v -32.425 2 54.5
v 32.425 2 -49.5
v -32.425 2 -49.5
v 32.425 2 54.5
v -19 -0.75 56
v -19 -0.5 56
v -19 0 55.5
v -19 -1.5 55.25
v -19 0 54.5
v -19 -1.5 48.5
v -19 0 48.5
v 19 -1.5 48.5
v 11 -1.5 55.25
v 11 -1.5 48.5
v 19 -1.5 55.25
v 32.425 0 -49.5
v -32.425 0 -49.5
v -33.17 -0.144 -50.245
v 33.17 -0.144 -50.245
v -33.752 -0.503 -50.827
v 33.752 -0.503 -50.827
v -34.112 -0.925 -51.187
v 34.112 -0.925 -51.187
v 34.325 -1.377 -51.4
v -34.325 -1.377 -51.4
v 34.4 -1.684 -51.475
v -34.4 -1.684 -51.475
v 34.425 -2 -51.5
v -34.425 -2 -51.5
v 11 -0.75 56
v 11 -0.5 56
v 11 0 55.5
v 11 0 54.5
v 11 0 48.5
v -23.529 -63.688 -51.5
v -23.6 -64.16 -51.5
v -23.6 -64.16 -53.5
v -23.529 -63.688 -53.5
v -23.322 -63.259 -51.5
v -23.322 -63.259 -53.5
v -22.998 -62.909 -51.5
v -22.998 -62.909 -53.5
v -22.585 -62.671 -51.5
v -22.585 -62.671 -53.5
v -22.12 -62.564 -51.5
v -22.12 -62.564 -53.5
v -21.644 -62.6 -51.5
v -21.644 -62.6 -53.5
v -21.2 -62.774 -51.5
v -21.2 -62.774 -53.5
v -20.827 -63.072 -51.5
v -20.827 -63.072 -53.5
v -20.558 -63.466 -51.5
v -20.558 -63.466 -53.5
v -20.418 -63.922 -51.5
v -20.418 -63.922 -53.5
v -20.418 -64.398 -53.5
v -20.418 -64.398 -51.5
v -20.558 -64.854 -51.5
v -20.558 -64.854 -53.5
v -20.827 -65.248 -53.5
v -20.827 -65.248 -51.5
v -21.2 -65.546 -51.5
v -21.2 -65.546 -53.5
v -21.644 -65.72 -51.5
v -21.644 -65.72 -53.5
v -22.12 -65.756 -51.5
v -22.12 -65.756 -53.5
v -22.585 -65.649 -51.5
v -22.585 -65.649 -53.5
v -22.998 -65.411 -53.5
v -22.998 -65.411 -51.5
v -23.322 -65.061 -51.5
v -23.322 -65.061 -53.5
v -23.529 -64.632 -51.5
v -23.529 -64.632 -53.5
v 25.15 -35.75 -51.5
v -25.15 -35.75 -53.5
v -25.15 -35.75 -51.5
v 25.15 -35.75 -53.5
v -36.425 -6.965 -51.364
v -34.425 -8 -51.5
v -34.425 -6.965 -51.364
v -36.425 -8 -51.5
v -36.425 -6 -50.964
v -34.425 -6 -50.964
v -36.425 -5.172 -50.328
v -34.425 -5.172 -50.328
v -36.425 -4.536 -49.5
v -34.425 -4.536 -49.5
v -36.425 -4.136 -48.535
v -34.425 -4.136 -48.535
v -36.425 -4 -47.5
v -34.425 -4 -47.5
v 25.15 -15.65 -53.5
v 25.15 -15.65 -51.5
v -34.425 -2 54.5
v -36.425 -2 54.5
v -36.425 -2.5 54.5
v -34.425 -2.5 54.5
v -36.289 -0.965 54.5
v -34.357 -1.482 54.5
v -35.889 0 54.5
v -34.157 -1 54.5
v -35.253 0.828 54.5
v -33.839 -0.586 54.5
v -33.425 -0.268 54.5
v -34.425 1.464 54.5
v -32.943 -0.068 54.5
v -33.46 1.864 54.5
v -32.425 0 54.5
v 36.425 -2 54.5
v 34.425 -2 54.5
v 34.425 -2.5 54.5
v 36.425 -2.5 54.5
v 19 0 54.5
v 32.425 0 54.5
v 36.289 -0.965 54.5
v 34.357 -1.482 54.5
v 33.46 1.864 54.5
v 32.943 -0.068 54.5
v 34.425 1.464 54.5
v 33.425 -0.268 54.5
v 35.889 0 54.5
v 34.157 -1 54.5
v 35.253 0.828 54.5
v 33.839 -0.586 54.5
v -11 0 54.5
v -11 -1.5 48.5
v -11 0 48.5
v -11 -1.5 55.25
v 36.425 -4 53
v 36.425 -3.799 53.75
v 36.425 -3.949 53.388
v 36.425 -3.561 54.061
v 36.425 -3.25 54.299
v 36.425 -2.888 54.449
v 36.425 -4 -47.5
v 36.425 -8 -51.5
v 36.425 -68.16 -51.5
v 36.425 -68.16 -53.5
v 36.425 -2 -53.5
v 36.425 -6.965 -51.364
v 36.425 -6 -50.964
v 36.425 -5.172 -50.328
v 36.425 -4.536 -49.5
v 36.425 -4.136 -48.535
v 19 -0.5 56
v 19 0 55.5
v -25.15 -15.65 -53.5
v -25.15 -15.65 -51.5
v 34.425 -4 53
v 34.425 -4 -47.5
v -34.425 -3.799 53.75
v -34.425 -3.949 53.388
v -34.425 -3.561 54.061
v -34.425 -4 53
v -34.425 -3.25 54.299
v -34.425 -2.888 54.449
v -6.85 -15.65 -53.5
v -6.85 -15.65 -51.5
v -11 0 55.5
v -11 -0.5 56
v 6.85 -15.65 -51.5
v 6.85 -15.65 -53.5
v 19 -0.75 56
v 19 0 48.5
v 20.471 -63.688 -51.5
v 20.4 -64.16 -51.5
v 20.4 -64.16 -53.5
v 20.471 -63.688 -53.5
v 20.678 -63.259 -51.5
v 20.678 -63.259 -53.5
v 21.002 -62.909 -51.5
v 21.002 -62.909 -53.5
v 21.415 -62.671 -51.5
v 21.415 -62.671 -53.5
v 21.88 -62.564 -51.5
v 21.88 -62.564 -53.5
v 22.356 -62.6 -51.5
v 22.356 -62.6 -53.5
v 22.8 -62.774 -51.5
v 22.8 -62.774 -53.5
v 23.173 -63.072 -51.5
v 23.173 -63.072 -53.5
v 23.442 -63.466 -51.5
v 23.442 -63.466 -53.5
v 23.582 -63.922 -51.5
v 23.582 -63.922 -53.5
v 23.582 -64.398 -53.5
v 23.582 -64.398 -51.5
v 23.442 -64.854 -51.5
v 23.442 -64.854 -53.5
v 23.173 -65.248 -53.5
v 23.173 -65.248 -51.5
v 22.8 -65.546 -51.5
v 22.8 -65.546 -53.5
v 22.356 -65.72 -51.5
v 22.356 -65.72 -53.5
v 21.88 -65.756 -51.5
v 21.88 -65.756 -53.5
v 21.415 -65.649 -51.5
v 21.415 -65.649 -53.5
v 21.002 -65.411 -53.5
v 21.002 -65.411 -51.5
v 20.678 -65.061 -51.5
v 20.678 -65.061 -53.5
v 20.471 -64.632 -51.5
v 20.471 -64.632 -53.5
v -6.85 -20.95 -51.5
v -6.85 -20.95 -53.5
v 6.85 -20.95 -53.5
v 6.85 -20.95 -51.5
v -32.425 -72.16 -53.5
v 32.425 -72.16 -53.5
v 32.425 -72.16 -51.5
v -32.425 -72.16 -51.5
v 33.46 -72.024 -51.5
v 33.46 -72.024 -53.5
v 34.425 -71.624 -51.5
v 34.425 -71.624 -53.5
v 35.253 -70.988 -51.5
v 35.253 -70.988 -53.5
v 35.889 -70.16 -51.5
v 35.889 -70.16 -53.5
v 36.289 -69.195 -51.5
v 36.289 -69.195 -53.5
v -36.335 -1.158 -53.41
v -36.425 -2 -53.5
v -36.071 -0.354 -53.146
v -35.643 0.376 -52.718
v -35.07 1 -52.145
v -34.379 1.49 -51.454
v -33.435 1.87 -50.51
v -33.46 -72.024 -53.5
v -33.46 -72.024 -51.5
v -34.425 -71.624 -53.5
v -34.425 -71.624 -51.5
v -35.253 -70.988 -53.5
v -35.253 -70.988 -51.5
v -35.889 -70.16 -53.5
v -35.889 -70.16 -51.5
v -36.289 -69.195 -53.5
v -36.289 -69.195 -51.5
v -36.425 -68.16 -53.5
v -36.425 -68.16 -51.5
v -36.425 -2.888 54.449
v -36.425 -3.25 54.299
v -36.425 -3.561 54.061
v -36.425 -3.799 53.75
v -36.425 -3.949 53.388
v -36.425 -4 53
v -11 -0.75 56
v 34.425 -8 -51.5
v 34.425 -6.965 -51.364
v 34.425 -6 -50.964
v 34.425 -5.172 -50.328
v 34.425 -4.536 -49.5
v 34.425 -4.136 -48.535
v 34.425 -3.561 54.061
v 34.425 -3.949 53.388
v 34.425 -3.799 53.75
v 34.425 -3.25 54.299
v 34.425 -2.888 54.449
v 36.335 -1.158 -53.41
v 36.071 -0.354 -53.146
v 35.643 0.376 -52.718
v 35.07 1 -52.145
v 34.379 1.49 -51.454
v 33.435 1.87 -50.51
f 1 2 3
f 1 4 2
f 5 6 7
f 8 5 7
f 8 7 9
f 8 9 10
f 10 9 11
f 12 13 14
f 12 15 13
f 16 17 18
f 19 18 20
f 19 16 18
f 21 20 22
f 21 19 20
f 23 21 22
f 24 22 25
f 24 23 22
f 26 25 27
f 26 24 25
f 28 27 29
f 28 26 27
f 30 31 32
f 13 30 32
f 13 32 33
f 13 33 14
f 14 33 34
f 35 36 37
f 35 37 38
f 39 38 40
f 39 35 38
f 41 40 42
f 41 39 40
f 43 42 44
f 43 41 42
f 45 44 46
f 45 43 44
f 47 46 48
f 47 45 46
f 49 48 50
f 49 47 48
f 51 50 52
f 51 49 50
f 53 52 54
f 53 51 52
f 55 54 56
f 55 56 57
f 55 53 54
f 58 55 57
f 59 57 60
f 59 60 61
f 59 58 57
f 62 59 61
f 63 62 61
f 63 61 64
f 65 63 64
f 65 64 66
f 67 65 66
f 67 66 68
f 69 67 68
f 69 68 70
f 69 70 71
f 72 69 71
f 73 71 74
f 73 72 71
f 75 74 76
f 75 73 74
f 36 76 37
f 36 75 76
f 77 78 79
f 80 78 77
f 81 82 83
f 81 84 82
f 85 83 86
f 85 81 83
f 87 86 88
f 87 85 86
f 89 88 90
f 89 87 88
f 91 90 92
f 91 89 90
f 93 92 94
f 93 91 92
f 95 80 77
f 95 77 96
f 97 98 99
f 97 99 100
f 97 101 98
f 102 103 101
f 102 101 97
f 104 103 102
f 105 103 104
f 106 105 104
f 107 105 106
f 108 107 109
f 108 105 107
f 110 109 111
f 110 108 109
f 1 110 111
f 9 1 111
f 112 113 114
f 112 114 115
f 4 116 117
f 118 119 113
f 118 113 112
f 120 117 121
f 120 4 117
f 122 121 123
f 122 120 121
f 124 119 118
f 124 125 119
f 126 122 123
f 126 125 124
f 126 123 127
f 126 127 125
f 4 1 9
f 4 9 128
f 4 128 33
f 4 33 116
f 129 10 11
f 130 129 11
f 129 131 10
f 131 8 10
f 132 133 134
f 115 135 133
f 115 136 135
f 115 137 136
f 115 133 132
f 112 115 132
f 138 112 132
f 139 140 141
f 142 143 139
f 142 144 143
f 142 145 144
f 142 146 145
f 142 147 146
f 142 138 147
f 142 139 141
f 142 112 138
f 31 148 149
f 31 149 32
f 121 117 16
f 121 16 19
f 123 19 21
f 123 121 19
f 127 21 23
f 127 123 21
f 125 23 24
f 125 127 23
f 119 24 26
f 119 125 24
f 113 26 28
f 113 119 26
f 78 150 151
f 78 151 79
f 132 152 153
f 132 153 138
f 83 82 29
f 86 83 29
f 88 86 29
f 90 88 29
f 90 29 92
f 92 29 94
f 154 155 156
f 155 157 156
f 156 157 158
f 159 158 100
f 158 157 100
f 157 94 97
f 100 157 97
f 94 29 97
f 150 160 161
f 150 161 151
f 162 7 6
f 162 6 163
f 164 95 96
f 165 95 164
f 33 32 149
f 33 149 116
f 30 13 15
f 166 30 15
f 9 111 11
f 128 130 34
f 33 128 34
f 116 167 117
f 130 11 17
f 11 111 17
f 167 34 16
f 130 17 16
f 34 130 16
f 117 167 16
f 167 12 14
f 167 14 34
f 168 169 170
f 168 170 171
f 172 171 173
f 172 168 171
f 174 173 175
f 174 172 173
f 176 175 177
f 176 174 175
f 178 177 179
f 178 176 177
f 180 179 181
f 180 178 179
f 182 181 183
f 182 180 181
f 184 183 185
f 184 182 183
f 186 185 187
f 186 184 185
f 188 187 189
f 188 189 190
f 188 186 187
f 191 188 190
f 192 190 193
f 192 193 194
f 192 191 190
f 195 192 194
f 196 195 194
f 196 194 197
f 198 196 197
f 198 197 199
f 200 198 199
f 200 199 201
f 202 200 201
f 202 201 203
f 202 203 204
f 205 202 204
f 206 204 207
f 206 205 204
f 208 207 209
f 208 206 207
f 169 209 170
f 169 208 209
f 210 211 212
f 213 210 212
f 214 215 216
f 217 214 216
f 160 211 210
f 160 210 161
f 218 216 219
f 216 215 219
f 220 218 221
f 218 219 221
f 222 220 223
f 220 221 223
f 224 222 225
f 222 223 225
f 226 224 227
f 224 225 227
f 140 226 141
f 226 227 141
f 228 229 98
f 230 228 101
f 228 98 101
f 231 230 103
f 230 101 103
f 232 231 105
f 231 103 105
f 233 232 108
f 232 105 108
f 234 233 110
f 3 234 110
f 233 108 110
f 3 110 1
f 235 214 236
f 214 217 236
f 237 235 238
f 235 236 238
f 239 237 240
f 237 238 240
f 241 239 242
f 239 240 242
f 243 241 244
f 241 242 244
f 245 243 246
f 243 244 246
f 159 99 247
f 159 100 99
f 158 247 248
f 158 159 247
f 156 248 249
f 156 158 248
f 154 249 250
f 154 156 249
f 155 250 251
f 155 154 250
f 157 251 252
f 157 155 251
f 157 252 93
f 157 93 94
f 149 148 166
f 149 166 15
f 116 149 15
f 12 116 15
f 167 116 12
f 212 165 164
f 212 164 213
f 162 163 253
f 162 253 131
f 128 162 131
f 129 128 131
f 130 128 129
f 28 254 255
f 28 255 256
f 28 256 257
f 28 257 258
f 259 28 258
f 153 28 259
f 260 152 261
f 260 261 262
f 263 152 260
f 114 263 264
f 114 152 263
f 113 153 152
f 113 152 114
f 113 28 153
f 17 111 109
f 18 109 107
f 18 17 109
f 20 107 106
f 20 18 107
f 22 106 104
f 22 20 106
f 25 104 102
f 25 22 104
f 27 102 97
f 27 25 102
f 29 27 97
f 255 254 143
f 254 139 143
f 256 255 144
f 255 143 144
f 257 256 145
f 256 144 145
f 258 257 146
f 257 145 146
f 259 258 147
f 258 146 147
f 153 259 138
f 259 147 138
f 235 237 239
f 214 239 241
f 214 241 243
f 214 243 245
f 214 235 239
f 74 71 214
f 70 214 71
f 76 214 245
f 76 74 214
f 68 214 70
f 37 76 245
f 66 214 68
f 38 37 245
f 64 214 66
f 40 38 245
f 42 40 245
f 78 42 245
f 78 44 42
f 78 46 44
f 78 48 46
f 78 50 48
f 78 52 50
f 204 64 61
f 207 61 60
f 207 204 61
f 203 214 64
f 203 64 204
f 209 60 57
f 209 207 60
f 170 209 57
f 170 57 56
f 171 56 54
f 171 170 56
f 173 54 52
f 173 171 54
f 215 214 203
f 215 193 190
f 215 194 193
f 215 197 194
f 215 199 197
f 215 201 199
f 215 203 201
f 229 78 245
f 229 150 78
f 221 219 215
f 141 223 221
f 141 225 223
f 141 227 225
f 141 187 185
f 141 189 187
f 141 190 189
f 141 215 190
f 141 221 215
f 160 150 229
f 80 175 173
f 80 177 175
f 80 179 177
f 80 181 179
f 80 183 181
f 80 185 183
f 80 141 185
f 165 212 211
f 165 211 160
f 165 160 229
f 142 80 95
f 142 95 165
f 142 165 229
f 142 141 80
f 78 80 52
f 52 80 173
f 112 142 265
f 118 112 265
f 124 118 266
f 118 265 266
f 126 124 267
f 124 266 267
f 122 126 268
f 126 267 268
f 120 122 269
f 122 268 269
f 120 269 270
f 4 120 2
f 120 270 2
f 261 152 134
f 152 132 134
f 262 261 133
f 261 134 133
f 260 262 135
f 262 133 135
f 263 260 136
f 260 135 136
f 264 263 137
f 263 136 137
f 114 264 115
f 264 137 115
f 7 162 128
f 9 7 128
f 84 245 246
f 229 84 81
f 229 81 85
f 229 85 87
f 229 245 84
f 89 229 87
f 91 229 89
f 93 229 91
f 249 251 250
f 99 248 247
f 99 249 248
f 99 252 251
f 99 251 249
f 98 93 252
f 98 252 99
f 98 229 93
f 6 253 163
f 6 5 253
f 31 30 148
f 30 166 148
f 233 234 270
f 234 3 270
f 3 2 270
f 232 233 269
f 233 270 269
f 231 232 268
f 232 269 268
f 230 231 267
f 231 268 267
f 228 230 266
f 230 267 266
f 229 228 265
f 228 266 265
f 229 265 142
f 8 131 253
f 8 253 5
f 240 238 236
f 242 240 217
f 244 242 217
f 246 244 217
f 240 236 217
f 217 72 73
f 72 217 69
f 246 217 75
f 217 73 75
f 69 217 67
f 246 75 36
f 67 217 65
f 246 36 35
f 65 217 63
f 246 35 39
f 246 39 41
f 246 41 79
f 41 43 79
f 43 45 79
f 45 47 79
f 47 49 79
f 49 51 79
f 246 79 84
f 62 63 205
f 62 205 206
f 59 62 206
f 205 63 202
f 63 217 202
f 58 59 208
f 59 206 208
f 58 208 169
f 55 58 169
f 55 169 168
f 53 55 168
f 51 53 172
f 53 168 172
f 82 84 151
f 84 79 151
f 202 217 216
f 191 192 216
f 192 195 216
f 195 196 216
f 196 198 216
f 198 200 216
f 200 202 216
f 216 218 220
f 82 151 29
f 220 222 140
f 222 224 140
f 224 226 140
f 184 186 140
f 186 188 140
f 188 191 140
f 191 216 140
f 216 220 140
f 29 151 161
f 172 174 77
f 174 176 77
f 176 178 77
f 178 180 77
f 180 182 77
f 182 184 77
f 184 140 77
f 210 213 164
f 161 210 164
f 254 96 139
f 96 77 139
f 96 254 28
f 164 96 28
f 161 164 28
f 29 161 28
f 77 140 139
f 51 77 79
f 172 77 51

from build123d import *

# Parameters (mm, degrees)
SKETCH1_W                = 68.85
SKETCH1_H                = 107
BOSS_EXTRUDE1_DEPTH      = 2
SKETCH2_W                = 68.85
SKETCH2_H                = 2
BOSS_EXTRUDE2_DEPTH      = 67
CUT_EXTRUDE2_REACH       = 132.855
SKETCH5_W                = 68.85
SKETCH5_H                = 2
BOSS_EXTRUDE3_DEPTH      = 51
SKETCH6_W                = 68.85
SKETCH6_H                = 2
BOSS_EXTRUDE4_DEPTH      = 20.36
BOSS_EXTRUDE5_DEPTH      = 1.5
SKETCH13_W               = 2
SKETCH13_H               = 1.5
BOSS_EXTRUDE8_DEPTH      = 3
CUT_EXTRUDE4_REACH       = 97.75
SKETCH9_R                = 1.75
FILLET1_R                = 1.5
FILLET2_R                = 3
FILLET3_R                = 1.5
FILLET4_R                = 3
CUT_EXTRUDE5_REACH       = 111.975
SKETCH10_R               = 1.75
CHAMFER1_SIZE            = 2
SKETCH11_W               = 2
SKETCH11_H               = 109
BOSS_EXTRUDE6_DEPTH      = 4.5
SKETCH14_W               = 68.85
SKETCH14_H               = 0.5
BOSS_EXTRUDE9_DEPTH      = 2
FILLET5_R                = 2
FILLET6_R                = 4
FILLET8_R                = 4
CUT_EXTRUDE6_DEPTH       = 1
CUT_EXTRUDE7_DEPTH       = 125.986967721
SKETCH17_W               = 68.85
SKETCH17_H               = 2
BOSS_EXTRUDE10_DEPTH     = 8.66
SKETCH18_W               = 2
SKETCH18_H               = 68.16
BOSS_EXTRUDE11_DEPTH     = 2
SKETCH19_W               = 2
SKETCH19_H               = 68.16
BOSS_EXTRUDE12_DEPTH     = 2
FILLET9_R                = 4
FILLET10_R               = 4
FILLET11_R               = 1.5
BOSS_EXTRUDE13_START     = -2
BOSS_EXTRUDE13_OUTLINE_R = 1.6
BOSS_EXTRUDE13_DEPTH     = 2
BOSS_EXTRUDE14_START     = 15
SKETCH21_W               = 7.5
SKETCH21_H               = 1.5
BOSS_EXTRUDE14_DEPTH     = 4
CHAMFER2_SIZE            = 0.5
CHAMFER3_SIZE            = 0.75


# Read off the part's stored shape, not the designer's step: Boss-Extrude13
with BuildPart() as part:
    # Sketch1 → Boss-Extrude1 (new body)
    with BuildSketch(Plane(origin=(0, 0, 0), x_dir=(1, 0, 0), z_dir=(0, 1, 0))):
        Rectangle(SKETCH1_W, SKETCH1_H)
    extrude(amount=BOSS_EXTRUDE1_DEPTH)

    # Sketch2 → Boss-Extrude2 (add)
    with BuildSketch(Plane.XZ):
        with Locations((0, -52.5)):
            Rectangle(SKETCH2_W, SKETCH2_H)
    extrude(amount=BOSS_EXTRUDE2_DEPTH)

    # Sketch4 → Cut-Extrude2 (cut, up to next)
    with BuildSketch(Plane(origin=(0, 0, -53.5), x_dir=(-1, 0, 0), z_dir=(0, 0, -1)), mode=Mode.PRIVATE) as cut_extrude2_sk1:
        Polygon((-6.85, -15.65), (-6.85, -20.95), (-5.325, -20.95), (6.85, -20.95), (6.85, -15.65), (25.15, -15.65), (25.15, -35.75), (-25.15, -35.75), (-25.15, -15.65), align=None)
    cut_extrude2_tool1 = extrude(cut_extrude2_sk1.sketch, amount=-CUT_EXTRUDE2_REACH, mode=Mode.PRIVATE) & part.part
    add(cut_extrude2_tool1.solids().sort_by_distance((0, -26.272573, -53.5))[0], mode=Mode.SUBTRACT)

    # Sketch5 → Boss-Extrude3 (add)
    with BuildSketch(Plane.XY.offset(-51.5)):
        with Locations((0, -66)):
            Rectangle(SKETCH5_W, SKETCH5_H)
    extrude(amount=BOSS_EXTRUDE3_DEPTH)

    # Sketch6 → Boss-Extrude4 (add)
    with BuildSketch(Plane.XZ.offset(67)):
        with Locations((0, -1.5)):
            Rectangle(SKETCH6_W, SKETCH6_H)
    extrude(amount=BOSS_EXTRUDE4_DEPTH)

    # Sketch8 → Boss-Extrude5 (add)
    with BuildSketch(Plane(origin=(0, 2, 0), x_dir=(1, 0, 0), z_dir=(0, 1, 0))):
        Polygon((-36.425, 50.5), (-34.425, 50.5), (-34.425, -53.5), (34.425, -53.5), (34.425, 50.5), (36.425, 50.5), (36.425, -55.5), (-36.425, -55.5), align=None)
    extrude(amount=-BOSS_EXTRUDE5_DEPTH)

    # Sketch13 → Boss-Extrude8 (add)
    with BuildSketch(Plane(origin=(0, 0, -50.5), x_dir=(-1, 0, 0), z_dir=(0, 0, -1))):
        with Locations((35.425, 1.25)):
            Rectangle(SKETCH13_W, SKETCH13_H)
        with Locations((-35.425, 1.25)):
            Rectangle(SKETCH13_W, SKETCH13_H)
    extrude(amount=BOSS_EXTRUDE8_DEPTH)

    # Sketch9 → Cut-Extrude4 (cut, up to next)
    with BuildSketch(Plane.XZ.offset(67), mode=Mode.PRIVATE) as cut_extrude4_sk1:
        with Locations(Location((-25, -23.48, 0), (0, 0, 270))):
            Circle(SKETCH9_R)
    cut_extrude4_tool1 = extrude(cut_extrude4_sk1.sketch, amount=-CUT_EXTRUDE4_REACH, mode=Mode.PRIVATE) & part.part
    # Sketch9 → Cut-Extrude4 (cut, up to next)
    with BuildSketch(Plane.XZ.offset(67), mode=Mode.PRIVATE) as cut_extrude4_sk2:
        with Locations(Location((25, -23.48, 0), (0, 0, 270))):
            Circle(SKETCH9_R)
    cut_extrude4_tool2 = extrude(cut_extrude4_sk2.sketch, amount=-CUT_EXTRUDE4_REACH, mode=Mode.PRIVATE) & part.part
    add(cut_extrude4_tool1.solids().sort_by_distance((-25, -67, -23.48))[0], mode=Mode.SUBTRACT)
    add(cut_extrude4_tool2.solids().sort_by_distance((25, -67, -23.48))[0], mode=Mode.SUBTRACT)

    # Fillet1
    fillet1_edges = [part.edges().sort_by_distance(p)[0] for p in [
        (0, -67, -2.5),
    ]]
    fillet(fillet1_edges, radius=FILLET1_R)

    # Fillet2
    fillet2_edges = [part.edges().sort_by_distance(p)[0] for p in [
        (0, -65, -0.5),
    ]]
    fillet(fillet2_edges, radius=FILLET2_R)

    # Fillet3
    fillet3_edges = [part.edges().sort_by_distance(p)[0] for p in [
        (0, -65, -51.5),
    ]]
    fillet(fillet3_edges, radius=FILLET3_R)

    # Fillet4
    fillet4_edges = [part.edges().sort_by_distance(p)[0] for p in [
        (0, -67, -53.5),
    ]]
    fillet(fillet4_edges, radius=FILLET4_R)

    # Sketch10 → Cut-Extrude5 (cut, up to next)
    with BuildSketch(Plane.XY.offset(-0.5), mode=Mode.PRIVATE) as cut_extrude5_sk1:
        with Locations((-24.425, -79.36)):
            Circle(SKETCH10_R)
    cut_extrude5_tool1 = extrude(cut_extrude5_sk1.sketch, amount=-CUT_EXTRUDE5_REACH, mode=Mode.PRIVATE) & part.part
    # Sketch10 → Cut-Extrude5 (cut, up to next)
    with BuildSketch(Plane.XY.offset(-0.5), mode=Mode.PRIVATE) as cut_extrude5_sk2:
        with Locations((24.425, -79.36)):
            Circle(SKETCH10_R)
    cut_extrude5_tool2 = extrude(cut_extrude5_sk2.sketch, amount=-CUT_EXTRUDE5_REACH, mode=Mode.PRIVATE) & part.part
    add(cut_extrude5_tool1.solids().sort_by_distance((-24.425, -79.36, -0.5))[0], mode=Mode.SUBTRACT)
    add(cut_extrude5_tool2.solids().sort_by_distance((24.425, -79.36, -0.5))[0], mode=Mode.SUBTRACT)

    # Chamfer1
    chamfer1_edges = [part.edges().sort_by_distance(p)[0] for p in [
        (-34.425, -87.36, -1.5),
        (34.425, -87.36, -1.5),
    ]]
    chamfer(chamfer1_edges, length=CHAMFER1_SIZE)

    # Sketch11 → Boss-Extrude6 (add)
    with BuildSketch(Plane.XZ.offset(-0.5)):
        with Locations((35.425, 1)):
            Rectangle(SKETCH11_W, SKETCH11_H)
        with Locations((-35.425, 1)):
            Rectangle(SKETCH11_W, SKETCH11_H)
    extrude(amount=BOSS_EXTRUDE6_DEPTH)

    # Sketch14 → Boss-Extrude9 (add)
    with BuildSketch(Plane.XY.offset(53.5)):
        with Locations((0, 0.25)):
            Rectangle(SKETCH14_W, SKETCH14_H)
    extrude(amount=BOSS_EXTRUDE9_DEPTH)

    # Fillet5
    fillet5_edges = [part.edges().sort_by_distance(p)[0] for p in [
        (0, 0, -51.5),
        (34.425, 0, 2),
        (-34.425, 0, 2),
    ]]
    fillet(fillet5_edges, radius=FILLET5_R)

    # Fillet6
    fillet6_edges = [part.edges().sort_by_distance(p)[0] for p in [
        (0, 2, -53.5),
    ]]
    fillet(fillet6_edges, radius=FILLET6_R)

    # Fillet8
    # the kernel refuses this fillet: 4 mm, written as the material it takes off along each edge
    with BuildSketch(Plane(origin=(-36.425, 2, 65.5), x_dir=(1, 0, 0), z_dir=(0, 0, -1))) as fillet8_piece_1:
        with BuildLine():
            CenterArc((FILLET8_R, FILLET8_R), FILLET8_R, 180, 90)
            Line((0, FILLET8_R), (0, 0))
            Line((0, 0), (FILLET8_R, 0))
        make_face()
    extrude(amount=125, mode=Mode.SUBTRACT)
    with BuildSketch(Plane(origin=(36.425, 2, -59.5), x_dir=(0, -1, 0), z_dir=(0, 0, 1))) as fillet8_piece_2:
        with BuildLine():
            CenterArc((FILLET8_R, -FILLET8_R), FILLET8_R, 90, 90)
            Line((0, -FILLET8_R), (0, 0))
            Line((0, 0), (FILLET8_R, 0))
        make_face()
    extrude(amount=125, mode=Mode.SUBTRACT)

    # Sketch15 → Cut-Extrude6 (cut)
    with BuildSketch(Plane.XY.offset(55.5)):
        with BuildLine():
            Line((-36.425, -2), (-36.425, -4))
            Line((-36.425, -4), (-34.425, -4))
            Line((-34.425, -4), (-34.425, -2))
            ThreePointArc((-34.425, -2), (-33.839213562, -0.585786438), (-32.425, 0))
            Line((-32.425, 0), (32.425, 0))
            ThreePointArc((32.425, 0), (33.839213562, -0.585786438), (34.425, -2))
            Line((34.425, -2), (34.425, -4))
            Line((34.425, -4), (36.425, -4))
            Line((36.425, -4), (36.425, -2))
            ThreePointArc((36.425, -2), (35.253427125, 0.828427125), (32.425, 2))
            Line((32.425, 2), (-32.425, 2))
            ThreePointArc((-32.425, 2), (-35.253427125, 0.828427125), (-36.425, -2))
        make_face()
    extrude(amount=-CUT_EXTRUDE6_DEPTH, mode=Mode.SUBTRACT)

    # Sketch16 → Cut-Extrude7 (cut, through all)
    with BuildSketch(Plane(origin=(34.425, 0, 0), x_dir=(0, 0, -1), z_dir=(1, 0, 0))):
        with BuildLine():
            Line((2.5, -87.36), (0.5, -87.36))
            Line((0.5, -87.36), (0.5, -68))
            ThreePointArc((0.5, -68), (1.378679656, -65.878679656), (3.5, -65))
            Line((3.5, -65), (50, -65))
            ThreePointArc((50, -65), (51.060660172, -64.560660172), (51.5, -63.5))
            Line((51.5, -63.5), (53.5, -63.5))
            Line((53.5, -63.5), (53.5, -64))
            ThreePointArc((53.5, -64), (52.621320344, -66.121320344), (50.5, -67))
            Line((50.5, -67), (4, -67))
            ThreePointArc((4, -67), (2.939339828, -67.439339828), (2.5, -68.5))
            Line((2.5, -68.5), (2.5, -87.36))
        make_face()
    extrude(amount=-CUT_EXTRUDE7_DEPTH, mode=Mode.SUBTRACT)

    # Sketch17 → Boss-Extrude10 (add)
    with BuildSketch(Plane.XZ.offset(63.5)):
        with Locations((0, -52.5)):
            Rectangle(SKETCH17_W, SKETCH17_H)
    extrude(amount=BOSS_EXTRUDE10_DEPTH)

    # Sketch18 → Boss-Extrude11 (add)
    with BuildSketch(Plane(origin=(34.425, 0, 0), x_dir=(0, 0, -1), z_dir=(1, 0, 0))):
        with Locations((52.5, -38.08)):
            Rectangle(SKETCH18_W, SKETCH18_H)
    extrude(amount=BOSS_EXTRUDE11_DEPTH)

    # Sketch19 → Boss-Extrude12 (add)
    with BuildSketch(Plane.ZY.offset(34.425)):
        with Locations((-52.5, -38.08)):
            Rectangle(SKETCH19_W, SKETCH19_H)
    extrude(amount=BOSS_EXTRUDE12_DEPTH)

    # Fillet9
    fillet9_edges = [part.edges().sort_by_distance(p)[0] for p in [
        (36.425, -72.16, -52.5),
        (-36.425, -72.16, -52.5),
    ]]
    fillet(fillet9_edges, radius=FILLET9_R)

    # Fillet10
    fillet10_edges = [part.edges().sort_by_distance(p)[0] for p in [
        (35.425, -4, -51.5),
        (-35.425, -4, -51.5),
    ]]
    fillet(fillet10_edges, radius=FILLET10_R)

    # Fillet11
    fillet11_edges = [part.edges().sort_by_distance(p)[0] for p in [
        (35.425, -4, 54.5),
        (-35.425, -4, 54.5),
    ]]
    fillet(fillet11_edges, radius=FILLET11_R)

    # Boss-Extrude13 outline → Boss-Extrude13 (cut)
    with BuildSketch(Plane(origin=(0, 0, -53.5), x_dir=(-1, 0, 0), z_dir=(0, 0, -1)).offset(BOSS_EXTRUDE13_START)):
        with Locations((22, -64.16)):
            Circle(BOSS_EXTRUDE13_OUTLINE_R)
        with Locations((-22, -64.16)):
            Circle(BOSS_EXTRUDE13_OUTLINE_R)
    extrude(amount=BOSS_EXTRUDE13_DEPTH, mode=Mode.SUBTRACT)

    # Sketch21 → Boss-Extrude14 (add, symmetric)
    with BuildSketch(Plane(origin=(0, 0, 0), x_dir=(0, 0, -1), z_dir=(1, 0, 0)).offset(BOSS_EXTRUDE14_START)):
        with Locations((-52.25, -0.75)):
            Rectangle(SKETCH21_W, SKETCH21_H)
    boss_extrude14 = extrude(amount=BOSS_EXTRUDE14_DEPTH, both=True)

    # Mirror1: Boss-Extrude14 across plane
    add(boss_extrude14.mirror(Plane(origin=(0, 0, 0), x_dir=(0, 0, 1), z_dir=(1, 0, 0))))

    # Chamfer2
    chamfer2_edges = [part.edges().sort_by_distance(p)[0] for p in [
        (15, 0, 56),
        (-15, 0, 56),
    ]]
    chamfer(chamfer2_edges, length=CHAMFER2_SIZE)

    # Chamfer3
    chamfer3_edges = [part.edges().sort_by_distance(p)[0] for p in [
        (15, -1.5, 56),
        (-15, -1.5, 56),
    ]]
    chamfer(chamfer3_edges, length=CHAMFER3_SIZE)


solid = part.part
